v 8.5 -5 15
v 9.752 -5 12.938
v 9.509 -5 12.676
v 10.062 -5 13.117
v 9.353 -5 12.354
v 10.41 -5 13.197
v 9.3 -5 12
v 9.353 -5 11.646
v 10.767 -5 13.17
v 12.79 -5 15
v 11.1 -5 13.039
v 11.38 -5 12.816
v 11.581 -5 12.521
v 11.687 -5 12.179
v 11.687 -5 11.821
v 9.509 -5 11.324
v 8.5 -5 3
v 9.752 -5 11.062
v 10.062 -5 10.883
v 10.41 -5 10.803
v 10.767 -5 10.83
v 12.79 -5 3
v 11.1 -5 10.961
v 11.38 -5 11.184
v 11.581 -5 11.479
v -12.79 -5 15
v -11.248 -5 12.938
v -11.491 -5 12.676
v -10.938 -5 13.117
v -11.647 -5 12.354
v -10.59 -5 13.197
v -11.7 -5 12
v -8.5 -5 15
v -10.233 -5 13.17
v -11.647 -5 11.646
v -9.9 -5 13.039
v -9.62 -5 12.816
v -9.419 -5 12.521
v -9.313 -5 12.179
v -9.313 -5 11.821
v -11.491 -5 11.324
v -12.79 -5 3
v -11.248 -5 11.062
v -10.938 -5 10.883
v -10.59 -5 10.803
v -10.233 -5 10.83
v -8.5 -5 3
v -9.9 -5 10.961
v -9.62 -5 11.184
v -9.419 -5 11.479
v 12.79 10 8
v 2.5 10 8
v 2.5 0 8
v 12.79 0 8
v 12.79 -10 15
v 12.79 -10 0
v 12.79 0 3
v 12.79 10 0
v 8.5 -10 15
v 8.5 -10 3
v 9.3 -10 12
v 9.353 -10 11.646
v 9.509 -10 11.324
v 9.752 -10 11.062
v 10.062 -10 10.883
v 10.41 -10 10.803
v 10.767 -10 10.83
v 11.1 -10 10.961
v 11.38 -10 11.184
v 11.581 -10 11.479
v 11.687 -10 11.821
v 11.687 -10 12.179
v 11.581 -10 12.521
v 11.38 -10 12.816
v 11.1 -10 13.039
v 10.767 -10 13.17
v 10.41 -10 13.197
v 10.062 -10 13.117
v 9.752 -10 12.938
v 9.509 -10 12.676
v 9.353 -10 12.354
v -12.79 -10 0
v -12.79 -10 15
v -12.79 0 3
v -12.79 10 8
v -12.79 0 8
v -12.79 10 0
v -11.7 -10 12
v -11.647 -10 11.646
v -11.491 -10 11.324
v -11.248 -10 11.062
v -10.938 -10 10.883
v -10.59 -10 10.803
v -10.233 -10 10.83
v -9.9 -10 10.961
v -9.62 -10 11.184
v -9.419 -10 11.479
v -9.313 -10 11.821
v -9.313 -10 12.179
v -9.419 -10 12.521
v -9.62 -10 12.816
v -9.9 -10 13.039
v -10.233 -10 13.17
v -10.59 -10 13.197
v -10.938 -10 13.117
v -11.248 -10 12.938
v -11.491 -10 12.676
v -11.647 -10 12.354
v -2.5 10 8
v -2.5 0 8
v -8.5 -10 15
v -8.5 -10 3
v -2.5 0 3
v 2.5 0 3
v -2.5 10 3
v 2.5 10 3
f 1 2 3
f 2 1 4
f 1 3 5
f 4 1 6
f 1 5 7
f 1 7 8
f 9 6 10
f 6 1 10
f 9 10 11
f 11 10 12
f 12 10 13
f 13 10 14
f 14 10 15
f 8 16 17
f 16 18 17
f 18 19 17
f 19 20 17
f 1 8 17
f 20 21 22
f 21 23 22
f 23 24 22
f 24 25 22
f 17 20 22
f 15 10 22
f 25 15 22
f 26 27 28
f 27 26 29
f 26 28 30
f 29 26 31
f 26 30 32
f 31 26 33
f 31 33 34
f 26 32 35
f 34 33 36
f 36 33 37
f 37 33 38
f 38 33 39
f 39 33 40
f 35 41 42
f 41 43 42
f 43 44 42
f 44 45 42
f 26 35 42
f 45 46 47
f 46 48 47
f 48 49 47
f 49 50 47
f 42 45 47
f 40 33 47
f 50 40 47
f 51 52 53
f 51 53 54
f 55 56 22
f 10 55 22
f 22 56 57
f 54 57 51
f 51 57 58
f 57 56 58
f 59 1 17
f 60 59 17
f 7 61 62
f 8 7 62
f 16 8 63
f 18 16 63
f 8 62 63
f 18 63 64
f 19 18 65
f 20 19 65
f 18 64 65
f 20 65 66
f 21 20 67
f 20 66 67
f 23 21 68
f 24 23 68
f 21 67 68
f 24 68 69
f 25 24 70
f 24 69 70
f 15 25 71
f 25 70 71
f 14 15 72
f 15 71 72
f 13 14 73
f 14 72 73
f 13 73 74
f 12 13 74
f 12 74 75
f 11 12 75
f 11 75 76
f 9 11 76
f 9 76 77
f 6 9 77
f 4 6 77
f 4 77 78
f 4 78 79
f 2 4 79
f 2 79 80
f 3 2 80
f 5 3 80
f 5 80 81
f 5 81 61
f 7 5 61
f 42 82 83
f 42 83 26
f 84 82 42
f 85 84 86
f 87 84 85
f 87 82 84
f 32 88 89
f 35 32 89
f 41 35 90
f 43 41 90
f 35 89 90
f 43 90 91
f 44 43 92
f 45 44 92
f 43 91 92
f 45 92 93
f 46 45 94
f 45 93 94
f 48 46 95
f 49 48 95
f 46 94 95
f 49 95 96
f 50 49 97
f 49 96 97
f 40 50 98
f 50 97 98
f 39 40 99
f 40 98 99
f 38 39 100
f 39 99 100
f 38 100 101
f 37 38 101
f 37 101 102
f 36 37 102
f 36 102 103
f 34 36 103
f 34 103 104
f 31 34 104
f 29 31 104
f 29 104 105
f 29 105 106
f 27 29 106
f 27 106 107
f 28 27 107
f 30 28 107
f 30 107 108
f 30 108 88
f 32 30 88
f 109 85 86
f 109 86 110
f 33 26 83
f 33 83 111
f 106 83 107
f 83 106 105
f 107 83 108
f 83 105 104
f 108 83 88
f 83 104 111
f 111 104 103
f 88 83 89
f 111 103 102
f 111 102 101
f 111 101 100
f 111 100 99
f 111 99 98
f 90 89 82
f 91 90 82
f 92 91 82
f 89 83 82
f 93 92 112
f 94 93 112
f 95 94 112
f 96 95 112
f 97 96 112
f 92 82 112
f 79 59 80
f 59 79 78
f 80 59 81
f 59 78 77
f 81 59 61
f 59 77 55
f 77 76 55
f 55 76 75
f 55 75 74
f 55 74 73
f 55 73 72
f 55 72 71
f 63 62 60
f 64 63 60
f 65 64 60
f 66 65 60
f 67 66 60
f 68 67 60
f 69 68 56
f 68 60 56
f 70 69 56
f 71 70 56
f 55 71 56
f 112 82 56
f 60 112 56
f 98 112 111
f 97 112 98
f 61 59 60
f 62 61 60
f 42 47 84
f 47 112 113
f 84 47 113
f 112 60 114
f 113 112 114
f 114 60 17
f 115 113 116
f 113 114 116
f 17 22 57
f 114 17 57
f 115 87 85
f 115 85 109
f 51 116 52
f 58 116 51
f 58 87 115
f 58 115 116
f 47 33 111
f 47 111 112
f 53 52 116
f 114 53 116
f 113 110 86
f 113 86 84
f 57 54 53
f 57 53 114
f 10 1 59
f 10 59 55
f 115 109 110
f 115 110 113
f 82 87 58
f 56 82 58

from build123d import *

# Parameters (mm, degrees)
SKETCH_1_W          = 25.58
SKETCH_1_H          = 20
EXTRUDE_1_DEPTH     = 15
SKETCH_4_W          = 25.58
SKETCH_4_H          = 15
CUT_EXTRUDE_3_DEPTH = 7
SKETCH_5_W          = 5
SKETCH_5_H          = 5
CUT_EXTRUDE_4_DEPTH = 32.294350928
CUT_EXTRUDE_5_REACH = 30.082
SKETCH_6_W          = 5
SKETCH_6_H          = 5
HOLE_WIZARD_M2_1_D  = 2.4
SKETCH_10_W         = 17
SKETCH_10_H         = 12
CUT_EXTRUDE_7_DEPTH = 25.770629786


with BuildPart() as part:
    # ｽｹｯﾁ1 → ﾎﾞｽ - 押し出し1 (new body)
    with BuildSketch(Plane.XY):
        Rectangle(SKETCH_1_W, SKETCH_1_H)
    extrude(amount=EXTRUDE_1_DEPTH)

    # ｽｹｯﾁ4 → ｶｯﾄ - 押し出し3 (cut)
    with BuildSketch(Plane.XY.offset(15)):
        with Locations((0, 2.5)):
            Rectangle(SKETCH_4_W, SKETCH_4_H)
    extrude(amount=-CUT_EXTRUDE_3_DEPTH, mode=Mode.SUBTRACT)

    # ｽｹｯﾁ5 → ｶｯﾄ - 押し出し4 (cut, through all)
    with BuildSketch(Plane(origin=(12.79, 0, 0), x_dir=(0, 0, -1), z_dir=(1, 0, 0))):
        with Locations((-5.5, -2.5)):
            Rectangle(SKETCH_5_W, SKETCH_5_H)
    extrude(amount=-CUT_EXTRUDE_4_DEPTH, mode=Mode.SUBTRACT)

    # ｽｹｯﾁ6 → ｶｯﾄ - 押し出し5 (cut, up to next)
    with BuildSketch(Plane(origin=(0, 10, 0), x_dir=(1, 0, 0), z_dir=(0, 1, 0)), mode=Mode.PRIVATE) as cut_extrude_5_sk1:
        with Locations((0, -5.5)):
            Rectangle(SKETCH_6_W, SKETCH_6_H)
    cut_extrude_5_tool1 = extrude(cut_extrude_5_sk1.sketch, amount=-CUT_EXTRUDE_5_REACH, mode=Mode.PRIVATE) & part.part
    add(cut_extrude_5_tool1.solids().sort_by_distance((0, 10, 5.5))[0], mode=Mode.SUBTRACT)

    # M2 すきま穴1 (through all)
    with Locations(Plane(origin=(0, -5, 0), x_dir=(1, 0, 0), z_dir=(0, 1, 0))):
        with Locations((10.5, -12), (-10.5, -12)):
            Hole(HOLE_WIZARD_M2_1_D / 2)

    # ｽｹｯﾁ10 → ｶｯﾄ - 押し出し7 (cut, through all)
    with BuildSketch(Plane(origin=(0, -5, 0), x_dir=(1, 0, 0), z_dir=(0, 1, 0))):
        with Locations((0, -9)):
            Rectangle(SKETCH_10_W, SKETCH_10_H)
    extrude(amount=-CUT_EXTRUDE_7_DEPTH, mode=Mode.SUBTRACT)


solid = part.part
